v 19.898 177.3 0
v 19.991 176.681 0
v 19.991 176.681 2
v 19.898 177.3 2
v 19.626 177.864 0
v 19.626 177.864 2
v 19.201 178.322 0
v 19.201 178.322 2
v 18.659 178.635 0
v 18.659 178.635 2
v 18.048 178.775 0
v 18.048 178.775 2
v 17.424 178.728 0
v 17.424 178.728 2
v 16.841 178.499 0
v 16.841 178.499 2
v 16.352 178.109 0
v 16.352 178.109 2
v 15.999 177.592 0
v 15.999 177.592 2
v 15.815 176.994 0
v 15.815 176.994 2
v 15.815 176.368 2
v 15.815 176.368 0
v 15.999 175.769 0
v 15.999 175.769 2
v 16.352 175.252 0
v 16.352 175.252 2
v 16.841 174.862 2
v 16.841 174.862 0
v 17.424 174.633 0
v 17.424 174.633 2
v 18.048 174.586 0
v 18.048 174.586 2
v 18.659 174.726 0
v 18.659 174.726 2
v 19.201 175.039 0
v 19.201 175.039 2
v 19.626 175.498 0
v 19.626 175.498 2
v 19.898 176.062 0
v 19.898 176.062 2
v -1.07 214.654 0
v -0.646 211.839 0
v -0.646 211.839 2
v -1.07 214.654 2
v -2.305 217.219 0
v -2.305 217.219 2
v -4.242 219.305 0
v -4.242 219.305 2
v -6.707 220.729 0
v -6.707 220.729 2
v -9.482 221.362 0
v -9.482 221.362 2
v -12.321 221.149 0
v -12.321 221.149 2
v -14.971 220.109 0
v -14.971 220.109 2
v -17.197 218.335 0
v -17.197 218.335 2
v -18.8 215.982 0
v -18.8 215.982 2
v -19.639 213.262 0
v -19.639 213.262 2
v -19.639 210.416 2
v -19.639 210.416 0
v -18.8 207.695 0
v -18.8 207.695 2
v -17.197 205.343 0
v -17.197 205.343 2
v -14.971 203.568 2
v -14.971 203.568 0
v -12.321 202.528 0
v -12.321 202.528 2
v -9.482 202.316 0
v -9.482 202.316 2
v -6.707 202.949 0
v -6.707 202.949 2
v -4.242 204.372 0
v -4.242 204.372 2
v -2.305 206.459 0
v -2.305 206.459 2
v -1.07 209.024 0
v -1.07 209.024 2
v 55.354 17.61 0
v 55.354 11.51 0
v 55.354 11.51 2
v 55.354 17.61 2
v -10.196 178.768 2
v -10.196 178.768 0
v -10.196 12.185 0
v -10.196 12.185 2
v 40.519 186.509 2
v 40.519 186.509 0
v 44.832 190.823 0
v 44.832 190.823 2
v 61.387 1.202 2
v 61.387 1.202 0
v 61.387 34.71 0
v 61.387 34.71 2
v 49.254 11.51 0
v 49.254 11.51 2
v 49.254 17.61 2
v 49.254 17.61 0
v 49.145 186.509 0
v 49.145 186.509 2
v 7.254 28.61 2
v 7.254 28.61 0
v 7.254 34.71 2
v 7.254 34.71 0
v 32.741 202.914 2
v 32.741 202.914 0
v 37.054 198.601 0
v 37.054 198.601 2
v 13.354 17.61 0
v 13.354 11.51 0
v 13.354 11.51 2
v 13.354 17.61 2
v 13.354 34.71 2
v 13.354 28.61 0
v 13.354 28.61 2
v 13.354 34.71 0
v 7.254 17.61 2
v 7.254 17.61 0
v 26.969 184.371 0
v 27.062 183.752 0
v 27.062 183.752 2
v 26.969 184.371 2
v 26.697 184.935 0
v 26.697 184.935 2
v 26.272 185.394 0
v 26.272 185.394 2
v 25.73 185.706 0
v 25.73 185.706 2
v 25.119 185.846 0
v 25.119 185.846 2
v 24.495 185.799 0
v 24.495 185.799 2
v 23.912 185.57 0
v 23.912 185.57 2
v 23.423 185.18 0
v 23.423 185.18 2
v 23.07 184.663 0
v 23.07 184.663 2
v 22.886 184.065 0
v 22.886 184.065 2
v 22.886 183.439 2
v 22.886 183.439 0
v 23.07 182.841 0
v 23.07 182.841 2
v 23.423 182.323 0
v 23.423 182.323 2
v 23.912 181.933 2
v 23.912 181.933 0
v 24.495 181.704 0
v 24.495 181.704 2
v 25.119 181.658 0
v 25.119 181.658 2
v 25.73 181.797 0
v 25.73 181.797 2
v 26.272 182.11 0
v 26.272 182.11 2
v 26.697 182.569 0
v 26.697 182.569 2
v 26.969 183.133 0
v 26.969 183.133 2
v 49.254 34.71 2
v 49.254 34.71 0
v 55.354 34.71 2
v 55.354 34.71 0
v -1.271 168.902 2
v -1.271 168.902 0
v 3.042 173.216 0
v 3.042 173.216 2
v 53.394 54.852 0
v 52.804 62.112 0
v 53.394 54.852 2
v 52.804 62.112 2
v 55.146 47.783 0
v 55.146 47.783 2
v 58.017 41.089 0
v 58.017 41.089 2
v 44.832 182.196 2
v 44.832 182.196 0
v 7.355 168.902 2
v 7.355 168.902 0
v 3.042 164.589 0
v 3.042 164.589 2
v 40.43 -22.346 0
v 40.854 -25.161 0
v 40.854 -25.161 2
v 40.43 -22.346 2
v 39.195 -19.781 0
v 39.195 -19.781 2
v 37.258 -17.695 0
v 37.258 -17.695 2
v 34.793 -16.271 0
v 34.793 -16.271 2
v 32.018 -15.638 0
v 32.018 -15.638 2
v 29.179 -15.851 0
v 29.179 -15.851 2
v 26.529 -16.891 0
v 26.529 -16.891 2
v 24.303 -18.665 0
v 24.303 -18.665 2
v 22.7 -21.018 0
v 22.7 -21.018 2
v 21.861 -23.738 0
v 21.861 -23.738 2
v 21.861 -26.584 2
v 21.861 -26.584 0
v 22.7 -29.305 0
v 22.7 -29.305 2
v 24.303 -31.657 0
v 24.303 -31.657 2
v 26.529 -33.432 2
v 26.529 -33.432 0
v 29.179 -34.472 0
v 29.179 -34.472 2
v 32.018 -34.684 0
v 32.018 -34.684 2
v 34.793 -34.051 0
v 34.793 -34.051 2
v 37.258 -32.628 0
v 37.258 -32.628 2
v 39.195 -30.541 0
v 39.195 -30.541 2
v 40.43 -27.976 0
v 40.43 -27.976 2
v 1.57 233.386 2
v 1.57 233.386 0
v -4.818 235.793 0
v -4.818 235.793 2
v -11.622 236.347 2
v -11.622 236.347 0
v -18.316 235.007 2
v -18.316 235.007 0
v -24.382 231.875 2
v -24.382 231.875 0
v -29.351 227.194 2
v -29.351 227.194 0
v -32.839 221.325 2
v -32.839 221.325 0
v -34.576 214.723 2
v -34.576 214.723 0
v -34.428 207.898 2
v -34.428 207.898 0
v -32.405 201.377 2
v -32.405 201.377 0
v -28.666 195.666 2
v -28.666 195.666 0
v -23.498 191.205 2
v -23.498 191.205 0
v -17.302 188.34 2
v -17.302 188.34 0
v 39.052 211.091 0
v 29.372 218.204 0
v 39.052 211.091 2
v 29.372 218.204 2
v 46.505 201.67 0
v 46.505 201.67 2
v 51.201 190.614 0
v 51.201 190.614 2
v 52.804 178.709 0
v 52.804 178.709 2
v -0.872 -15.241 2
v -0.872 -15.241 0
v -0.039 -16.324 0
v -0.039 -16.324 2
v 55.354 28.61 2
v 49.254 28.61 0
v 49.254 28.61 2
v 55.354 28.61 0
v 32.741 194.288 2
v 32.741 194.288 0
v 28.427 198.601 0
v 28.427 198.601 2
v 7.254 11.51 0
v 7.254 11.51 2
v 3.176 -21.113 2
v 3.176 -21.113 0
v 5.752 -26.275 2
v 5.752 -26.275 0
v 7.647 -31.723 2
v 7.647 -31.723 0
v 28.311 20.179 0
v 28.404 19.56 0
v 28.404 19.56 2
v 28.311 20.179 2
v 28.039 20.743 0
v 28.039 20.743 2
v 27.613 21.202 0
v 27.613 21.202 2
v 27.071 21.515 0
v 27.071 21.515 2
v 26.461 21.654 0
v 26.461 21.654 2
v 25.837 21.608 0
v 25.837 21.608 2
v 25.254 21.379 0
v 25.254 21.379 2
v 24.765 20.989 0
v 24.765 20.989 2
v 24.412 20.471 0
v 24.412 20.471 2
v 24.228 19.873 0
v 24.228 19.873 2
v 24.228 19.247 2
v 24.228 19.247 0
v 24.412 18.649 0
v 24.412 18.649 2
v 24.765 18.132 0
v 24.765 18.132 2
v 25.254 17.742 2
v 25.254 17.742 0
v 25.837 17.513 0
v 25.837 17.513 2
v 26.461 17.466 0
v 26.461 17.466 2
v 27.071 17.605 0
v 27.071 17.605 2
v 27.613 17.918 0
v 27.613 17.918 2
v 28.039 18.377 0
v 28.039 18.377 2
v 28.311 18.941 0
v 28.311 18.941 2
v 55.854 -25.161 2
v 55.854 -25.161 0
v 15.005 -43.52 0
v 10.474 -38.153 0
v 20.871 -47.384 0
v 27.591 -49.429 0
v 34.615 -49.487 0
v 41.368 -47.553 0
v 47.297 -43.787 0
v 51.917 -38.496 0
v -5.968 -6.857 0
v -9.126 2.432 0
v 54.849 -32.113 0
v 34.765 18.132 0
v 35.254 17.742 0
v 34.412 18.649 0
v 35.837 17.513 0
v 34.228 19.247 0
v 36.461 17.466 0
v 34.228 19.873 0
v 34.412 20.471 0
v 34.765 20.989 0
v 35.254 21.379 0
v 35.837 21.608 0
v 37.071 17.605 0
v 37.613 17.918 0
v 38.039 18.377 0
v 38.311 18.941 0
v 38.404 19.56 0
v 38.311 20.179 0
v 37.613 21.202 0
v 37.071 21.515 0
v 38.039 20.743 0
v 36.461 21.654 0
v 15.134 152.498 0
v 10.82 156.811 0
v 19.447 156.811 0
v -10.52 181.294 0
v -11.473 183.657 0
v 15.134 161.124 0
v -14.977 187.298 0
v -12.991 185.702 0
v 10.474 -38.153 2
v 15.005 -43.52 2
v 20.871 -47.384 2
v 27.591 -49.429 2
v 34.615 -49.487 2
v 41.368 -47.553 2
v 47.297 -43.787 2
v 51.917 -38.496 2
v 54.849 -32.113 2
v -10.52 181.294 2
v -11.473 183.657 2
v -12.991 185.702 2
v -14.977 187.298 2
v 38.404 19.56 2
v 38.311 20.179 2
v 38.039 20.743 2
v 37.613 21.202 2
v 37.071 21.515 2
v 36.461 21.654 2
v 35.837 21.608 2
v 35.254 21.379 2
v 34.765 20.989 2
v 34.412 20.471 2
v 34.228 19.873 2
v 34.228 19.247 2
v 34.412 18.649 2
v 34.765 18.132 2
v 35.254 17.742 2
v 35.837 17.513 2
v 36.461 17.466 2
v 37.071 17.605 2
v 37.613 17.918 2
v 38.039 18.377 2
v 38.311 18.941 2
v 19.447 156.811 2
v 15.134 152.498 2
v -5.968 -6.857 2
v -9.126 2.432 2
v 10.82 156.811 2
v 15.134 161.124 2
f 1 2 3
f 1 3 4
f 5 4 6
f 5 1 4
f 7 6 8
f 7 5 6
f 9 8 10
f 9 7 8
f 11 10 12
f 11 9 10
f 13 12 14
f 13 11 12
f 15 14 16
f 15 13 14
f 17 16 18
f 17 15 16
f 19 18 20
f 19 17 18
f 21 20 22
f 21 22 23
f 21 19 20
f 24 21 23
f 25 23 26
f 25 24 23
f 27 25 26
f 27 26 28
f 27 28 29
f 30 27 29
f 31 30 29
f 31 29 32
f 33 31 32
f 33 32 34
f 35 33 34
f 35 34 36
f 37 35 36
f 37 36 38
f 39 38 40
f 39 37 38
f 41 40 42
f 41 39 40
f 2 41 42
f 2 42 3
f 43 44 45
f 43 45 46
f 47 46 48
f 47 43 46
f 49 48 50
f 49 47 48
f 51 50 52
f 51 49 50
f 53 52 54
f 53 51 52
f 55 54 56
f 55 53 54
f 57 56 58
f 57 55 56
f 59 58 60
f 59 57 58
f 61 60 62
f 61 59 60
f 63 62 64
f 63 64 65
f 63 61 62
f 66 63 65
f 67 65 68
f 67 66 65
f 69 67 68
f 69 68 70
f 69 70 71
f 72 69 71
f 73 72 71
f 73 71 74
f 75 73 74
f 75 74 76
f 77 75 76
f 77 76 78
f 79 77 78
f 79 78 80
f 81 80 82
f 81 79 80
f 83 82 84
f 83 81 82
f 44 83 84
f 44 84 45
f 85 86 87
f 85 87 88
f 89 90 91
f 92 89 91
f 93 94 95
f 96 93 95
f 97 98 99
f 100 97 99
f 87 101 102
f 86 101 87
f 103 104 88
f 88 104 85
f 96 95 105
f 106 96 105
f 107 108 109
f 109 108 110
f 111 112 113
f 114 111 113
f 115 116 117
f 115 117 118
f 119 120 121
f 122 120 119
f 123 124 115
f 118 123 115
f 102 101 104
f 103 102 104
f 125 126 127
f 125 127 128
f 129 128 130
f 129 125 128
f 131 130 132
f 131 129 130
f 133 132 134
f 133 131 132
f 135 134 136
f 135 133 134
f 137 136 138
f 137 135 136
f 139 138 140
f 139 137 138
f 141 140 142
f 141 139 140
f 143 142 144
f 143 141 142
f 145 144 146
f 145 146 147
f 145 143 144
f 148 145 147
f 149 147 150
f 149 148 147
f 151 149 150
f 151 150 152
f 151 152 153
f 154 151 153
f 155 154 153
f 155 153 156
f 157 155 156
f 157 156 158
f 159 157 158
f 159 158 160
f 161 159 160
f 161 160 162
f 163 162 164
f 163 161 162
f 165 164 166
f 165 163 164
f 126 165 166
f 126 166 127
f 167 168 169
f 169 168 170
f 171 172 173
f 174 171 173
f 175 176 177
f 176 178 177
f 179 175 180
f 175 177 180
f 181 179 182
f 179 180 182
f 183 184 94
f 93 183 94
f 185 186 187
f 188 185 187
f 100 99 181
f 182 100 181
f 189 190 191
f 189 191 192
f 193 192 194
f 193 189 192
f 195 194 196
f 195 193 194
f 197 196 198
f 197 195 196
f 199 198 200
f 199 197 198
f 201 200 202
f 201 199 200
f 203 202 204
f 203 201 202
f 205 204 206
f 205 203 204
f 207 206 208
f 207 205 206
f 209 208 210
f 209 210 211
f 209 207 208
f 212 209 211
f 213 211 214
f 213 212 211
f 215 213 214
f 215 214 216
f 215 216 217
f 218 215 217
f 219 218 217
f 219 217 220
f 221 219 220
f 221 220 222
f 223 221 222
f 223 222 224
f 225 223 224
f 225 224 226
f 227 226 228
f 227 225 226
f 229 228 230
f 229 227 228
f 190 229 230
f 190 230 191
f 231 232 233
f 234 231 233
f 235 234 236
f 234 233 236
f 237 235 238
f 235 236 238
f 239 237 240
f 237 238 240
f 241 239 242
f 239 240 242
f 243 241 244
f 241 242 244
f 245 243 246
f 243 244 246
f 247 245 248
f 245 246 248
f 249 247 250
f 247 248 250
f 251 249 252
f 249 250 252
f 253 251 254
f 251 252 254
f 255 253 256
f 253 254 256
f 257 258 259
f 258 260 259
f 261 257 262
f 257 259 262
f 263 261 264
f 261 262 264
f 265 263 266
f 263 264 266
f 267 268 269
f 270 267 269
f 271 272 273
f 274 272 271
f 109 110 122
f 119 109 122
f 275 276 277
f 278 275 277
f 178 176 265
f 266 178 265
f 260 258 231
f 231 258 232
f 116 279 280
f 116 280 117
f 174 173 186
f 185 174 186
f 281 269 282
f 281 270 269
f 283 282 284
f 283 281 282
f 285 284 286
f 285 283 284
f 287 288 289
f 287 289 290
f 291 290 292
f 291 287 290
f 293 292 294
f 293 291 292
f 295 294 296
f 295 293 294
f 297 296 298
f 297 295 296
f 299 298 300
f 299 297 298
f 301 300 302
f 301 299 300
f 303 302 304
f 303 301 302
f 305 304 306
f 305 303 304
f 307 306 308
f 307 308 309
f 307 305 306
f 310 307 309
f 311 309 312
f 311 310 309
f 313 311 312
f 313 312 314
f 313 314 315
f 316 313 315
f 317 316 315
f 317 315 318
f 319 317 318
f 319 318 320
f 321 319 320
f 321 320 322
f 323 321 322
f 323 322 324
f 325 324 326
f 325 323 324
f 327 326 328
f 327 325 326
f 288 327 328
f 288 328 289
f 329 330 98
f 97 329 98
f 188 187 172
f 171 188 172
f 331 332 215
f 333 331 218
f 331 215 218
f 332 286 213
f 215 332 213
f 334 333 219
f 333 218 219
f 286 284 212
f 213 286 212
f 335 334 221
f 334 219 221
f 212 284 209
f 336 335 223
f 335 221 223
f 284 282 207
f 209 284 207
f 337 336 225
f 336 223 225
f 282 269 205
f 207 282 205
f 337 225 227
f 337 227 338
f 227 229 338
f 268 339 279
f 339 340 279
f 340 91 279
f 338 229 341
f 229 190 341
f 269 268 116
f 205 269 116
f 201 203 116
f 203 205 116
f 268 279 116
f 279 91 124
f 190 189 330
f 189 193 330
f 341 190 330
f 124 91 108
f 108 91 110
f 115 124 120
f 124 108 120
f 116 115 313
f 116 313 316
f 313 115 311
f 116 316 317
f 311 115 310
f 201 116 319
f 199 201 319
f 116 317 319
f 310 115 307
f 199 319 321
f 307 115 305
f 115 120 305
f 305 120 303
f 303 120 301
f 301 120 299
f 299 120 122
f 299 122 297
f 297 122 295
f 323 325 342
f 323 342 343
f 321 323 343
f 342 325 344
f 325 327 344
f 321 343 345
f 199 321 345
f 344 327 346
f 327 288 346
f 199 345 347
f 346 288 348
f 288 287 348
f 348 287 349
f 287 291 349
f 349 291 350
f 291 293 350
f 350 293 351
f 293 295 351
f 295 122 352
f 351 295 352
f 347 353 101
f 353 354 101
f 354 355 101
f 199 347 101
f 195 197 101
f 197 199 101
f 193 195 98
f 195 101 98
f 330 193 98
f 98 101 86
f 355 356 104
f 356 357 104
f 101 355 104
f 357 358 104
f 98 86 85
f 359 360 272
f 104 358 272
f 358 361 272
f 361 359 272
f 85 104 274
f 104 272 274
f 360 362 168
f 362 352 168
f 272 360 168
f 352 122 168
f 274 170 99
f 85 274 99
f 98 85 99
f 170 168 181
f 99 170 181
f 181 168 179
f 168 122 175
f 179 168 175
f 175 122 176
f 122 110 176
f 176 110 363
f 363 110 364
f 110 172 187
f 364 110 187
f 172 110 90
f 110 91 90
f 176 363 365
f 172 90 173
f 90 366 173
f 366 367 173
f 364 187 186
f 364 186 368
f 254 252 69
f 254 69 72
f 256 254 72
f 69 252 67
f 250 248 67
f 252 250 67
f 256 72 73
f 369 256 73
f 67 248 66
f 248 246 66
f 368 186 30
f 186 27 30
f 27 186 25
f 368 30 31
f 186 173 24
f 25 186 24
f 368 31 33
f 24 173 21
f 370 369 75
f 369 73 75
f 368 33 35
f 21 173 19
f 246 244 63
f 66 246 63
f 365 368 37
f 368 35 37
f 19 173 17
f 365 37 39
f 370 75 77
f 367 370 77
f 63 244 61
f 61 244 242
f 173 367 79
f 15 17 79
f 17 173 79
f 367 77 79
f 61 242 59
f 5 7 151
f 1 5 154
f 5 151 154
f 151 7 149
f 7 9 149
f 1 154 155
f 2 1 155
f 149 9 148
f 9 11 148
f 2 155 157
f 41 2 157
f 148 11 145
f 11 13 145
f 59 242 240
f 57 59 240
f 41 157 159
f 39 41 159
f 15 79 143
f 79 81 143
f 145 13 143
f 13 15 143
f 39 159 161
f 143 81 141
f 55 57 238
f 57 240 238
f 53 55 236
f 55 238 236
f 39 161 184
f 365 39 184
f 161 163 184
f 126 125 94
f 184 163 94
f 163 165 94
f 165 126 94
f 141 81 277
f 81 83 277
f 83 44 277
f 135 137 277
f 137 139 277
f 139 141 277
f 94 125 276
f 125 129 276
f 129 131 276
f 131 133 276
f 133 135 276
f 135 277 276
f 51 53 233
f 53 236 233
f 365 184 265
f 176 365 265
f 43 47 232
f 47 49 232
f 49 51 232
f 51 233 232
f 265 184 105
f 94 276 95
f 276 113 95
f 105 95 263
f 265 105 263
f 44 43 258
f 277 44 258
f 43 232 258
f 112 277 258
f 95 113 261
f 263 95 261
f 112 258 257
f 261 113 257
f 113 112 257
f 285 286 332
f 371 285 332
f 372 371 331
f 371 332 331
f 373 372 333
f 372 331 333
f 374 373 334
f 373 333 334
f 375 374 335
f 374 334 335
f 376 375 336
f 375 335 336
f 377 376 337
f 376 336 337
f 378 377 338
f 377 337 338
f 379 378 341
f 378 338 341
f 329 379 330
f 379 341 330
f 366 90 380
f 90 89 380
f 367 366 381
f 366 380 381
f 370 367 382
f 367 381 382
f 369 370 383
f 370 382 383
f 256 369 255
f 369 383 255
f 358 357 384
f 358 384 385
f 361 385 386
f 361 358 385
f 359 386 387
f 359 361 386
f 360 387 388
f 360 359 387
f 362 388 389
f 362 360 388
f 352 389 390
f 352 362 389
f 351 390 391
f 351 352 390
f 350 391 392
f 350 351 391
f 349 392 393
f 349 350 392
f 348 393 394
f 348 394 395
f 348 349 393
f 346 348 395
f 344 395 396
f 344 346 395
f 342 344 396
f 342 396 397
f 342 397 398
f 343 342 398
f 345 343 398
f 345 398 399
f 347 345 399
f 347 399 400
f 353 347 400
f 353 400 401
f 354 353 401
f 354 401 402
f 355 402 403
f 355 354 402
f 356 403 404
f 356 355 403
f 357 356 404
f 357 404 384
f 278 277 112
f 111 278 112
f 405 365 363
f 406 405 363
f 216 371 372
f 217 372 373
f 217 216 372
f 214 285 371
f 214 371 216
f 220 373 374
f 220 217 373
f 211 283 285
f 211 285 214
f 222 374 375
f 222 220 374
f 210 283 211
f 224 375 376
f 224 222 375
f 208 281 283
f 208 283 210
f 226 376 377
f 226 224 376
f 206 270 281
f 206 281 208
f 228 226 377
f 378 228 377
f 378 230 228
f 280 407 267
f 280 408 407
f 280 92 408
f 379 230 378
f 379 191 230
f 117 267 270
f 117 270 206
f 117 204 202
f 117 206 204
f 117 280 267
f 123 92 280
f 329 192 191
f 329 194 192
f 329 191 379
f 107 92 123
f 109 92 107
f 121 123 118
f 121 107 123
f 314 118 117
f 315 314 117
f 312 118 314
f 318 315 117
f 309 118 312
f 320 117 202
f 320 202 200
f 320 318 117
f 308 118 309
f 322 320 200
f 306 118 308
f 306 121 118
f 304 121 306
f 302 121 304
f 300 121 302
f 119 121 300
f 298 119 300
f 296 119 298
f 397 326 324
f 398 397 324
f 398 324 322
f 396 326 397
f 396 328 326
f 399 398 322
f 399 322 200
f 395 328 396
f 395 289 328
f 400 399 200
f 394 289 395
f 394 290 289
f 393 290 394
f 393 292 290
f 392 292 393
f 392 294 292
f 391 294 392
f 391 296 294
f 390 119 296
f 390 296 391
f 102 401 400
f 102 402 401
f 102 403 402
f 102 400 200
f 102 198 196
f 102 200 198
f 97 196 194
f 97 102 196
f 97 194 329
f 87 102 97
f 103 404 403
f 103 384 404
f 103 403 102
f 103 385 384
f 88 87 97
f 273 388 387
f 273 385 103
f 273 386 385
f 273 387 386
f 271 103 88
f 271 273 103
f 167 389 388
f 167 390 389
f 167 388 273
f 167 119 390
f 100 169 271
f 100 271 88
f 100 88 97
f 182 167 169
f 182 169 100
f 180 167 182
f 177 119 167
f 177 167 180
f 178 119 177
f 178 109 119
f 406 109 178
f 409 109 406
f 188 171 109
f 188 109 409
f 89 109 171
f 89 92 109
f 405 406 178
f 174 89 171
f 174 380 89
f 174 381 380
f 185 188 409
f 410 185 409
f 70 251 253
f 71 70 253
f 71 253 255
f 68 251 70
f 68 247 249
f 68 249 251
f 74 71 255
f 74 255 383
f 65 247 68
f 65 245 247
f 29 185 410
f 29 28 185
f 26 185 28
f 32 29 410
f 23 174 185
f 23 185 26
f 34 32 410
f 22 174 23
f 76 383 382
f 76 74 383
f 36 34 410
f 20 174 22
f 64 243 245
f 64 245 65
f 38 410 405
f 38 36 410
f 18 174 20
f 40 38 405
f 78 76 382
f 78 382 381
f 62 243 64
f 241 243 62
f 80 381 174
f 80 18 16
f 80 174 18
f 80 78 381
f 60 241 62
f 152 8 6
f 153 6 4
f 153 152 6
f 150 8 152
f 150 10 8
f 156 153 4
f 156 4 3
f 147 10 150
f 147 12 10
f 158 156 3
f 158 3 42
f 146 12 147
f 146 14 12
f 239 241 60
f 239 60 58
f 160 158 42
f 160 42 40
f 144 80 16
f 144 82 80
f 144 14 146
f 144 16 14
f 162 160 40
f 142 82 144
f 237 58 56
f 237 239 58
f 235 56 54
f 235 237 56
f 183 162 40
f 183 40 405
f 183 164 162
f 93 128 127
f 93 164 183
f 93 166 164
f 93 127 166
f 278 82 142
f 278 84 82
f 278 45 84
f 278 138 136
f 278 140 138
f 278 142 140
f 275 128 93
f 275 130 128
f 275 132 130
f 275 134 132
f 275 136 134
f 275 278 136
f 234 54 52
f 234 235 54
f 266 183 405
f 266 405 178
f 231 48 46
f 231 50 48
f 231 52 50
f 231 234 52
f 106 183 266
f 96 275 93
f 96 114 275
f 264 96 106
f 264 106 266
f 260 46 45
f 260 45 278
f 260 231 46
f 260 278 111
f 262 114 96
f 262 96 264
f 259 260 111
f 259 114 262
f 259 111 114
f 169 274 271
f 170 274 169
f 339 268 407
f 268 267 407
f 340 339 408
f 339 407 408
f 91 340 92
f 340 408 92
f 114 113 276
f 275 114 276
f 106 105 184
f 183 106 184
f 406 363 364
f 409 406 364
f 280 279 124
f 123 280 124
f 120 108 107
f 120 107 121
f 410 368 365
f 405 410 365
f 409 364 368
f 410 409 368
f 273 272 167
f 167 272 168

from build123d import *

# Parameters (mm, degrees)
SKETCH_1_W      = 6.1
SKETCH_1_H      = 6.1
SKETCH_1_R      = 9.55
SKETCH_1_R_2    = 2.1
EXTRUDE_2_DEPTH = 2
FILLET_1_R      = 45
FILLET_2_R      = 10


with BuildPart() as part:
    # 草图1 → 凸台-拉伸2 (new body)
    with BuildSketch(Plane.XY):
        with BuildLine():
            Line((-10.195923298, 166.045688989), (-10.195923298, 93.338899377))
            Line((-10.195923298, 93.338899377), (-10.195923298, -3.112918115))
            Line((-10.195923298, -3.112918115), (6.754076702, -25.161100623))
            ThreePointArc((6.754076702, -25.161100623), (31.304076702, -49.711100623), (55.854076702, -25.161100623))
            Line((55.854076702, -25.161100623), (61.387071712, 1.202006387))
            Line((61.387071712, 1.202006387), (61.387071712, 34.710258927))
            Line((61.387071712, 34.710258927), (52.804076702, 50.954174352))
            Line((52.804076702, 50.954174352), (52.804076702, 93.338899377))
            Line((52.804076702, 93.338899377), (52.804076702, 205.407441872))
            Line((52.804076702, 205.407441872), (1.570402993, 233.385501559))
            ThreePointArc((1.570402993, 233.385501559), (-33.983226461, 217.910695504), (-10.195923298, 187.288899377))
            Line((-10.195923298, 187.288899377), (-10.195923298, 166.045688989))
        make_face()
        with Locations((10.304076702, 14.560258927)):
            Rectangle(SKETCH_1_W, SKETCH_1_H, mode=Mode.SUBTRACT)
        with Locations((10.304076702, 31.660258927)):
            Rectangle(SKETCH_1_W, SKETCH_1_H, mode=Mode.SUBTRACT)
        with Locations((31.304076702, -25.161100623)):
            Circle(SKETCH_1_R, mode=Mode.SUBTRACT)
        with Locations((26.304076702, 19.560258927)):
            Circle(SKETCH_1_R_2, mode=Mode.SUBTRACT)
        with Locations((36.304076702, 19.560258927)):
            Circle(SKETCH_1_R_2, mode=Mode.SUBTRACT)
        with Locations((52.304076702, 14.560258927)):
            Rectangle(SKETCH_1_W, SKETCH_1_H, mode=Mode.SUBTRACT)
        with Locations((52.304076702, 31.660258927)):
            Rectangle(SKETCH_1_W, SKETCH_1_H, mode=Mode.SUBTRACT)
        Polygon((7.355428358, 168.902414276), (3.042076993, 164.589062911), (-1.271274372, 168.902414276), (3.042076993, 173.215765641), align=None, mode=Mode.SUBTRACT)
        with Locations((-10.195923298, 211.838899377)):
            Circle(SKETCH_1_R, mode=Mode.SUBTRACT)
        Polygon((19.446954316, 156.810888318), (15.133602951, 152.497536952), (10.820251586, 156.810888318), (15.133602951, 161.124239683), align=None, mode=Mode.SUBTRACT)
        with Locations((17.891319398, 176.680588869)):
            Circle(SKETCH_1_R_2, mode=Mode.SUBTRACT)
        with Locations((24.96238721, 183.751656681)):
            Circle(SKETCH_1_R_2, mode=Mode.SUBTRACT)
        Polygon((32.740561803, 202.914250451), (37.053913168, 198.600899086), (32.740561803, 194.28754772), (28.427210437, 198.600899086), align=None, mode=Mode.SUBTRACT)
        Polygon((49.145439126, 186.509373127), (44.832087761, 182.196021762), (40.518736396, 186.509373127), (44.832087761, 190.822724493), align=None, mode=Mode.SUBTRACT)
    extrude(amount=EXTRUDE_2_DEPTH)

    # 圆角1
    fillet_1_edges = [part.edges().sort_by_distance(p)[0] for p in [
        (-10.195923298, -3.112918115, 1),
        (52.804076702, 205.407441872, 1),
        (52.804076702, 50.954174352, 1),
        (6.754076702, -25.161100623, 1),
    ]]
    fillet(fillet_1_edges, radius=FILLET_1_R)

    # 圆角2
    fillet_2_edges = [part.edges().sort_by_distance(p)[0] for p in [
        (-10.195923298, 187.288899377, 1),
    ]]
    fillet(fillet_2_edges, radius=FILLET_2_R)


solid = part.part
